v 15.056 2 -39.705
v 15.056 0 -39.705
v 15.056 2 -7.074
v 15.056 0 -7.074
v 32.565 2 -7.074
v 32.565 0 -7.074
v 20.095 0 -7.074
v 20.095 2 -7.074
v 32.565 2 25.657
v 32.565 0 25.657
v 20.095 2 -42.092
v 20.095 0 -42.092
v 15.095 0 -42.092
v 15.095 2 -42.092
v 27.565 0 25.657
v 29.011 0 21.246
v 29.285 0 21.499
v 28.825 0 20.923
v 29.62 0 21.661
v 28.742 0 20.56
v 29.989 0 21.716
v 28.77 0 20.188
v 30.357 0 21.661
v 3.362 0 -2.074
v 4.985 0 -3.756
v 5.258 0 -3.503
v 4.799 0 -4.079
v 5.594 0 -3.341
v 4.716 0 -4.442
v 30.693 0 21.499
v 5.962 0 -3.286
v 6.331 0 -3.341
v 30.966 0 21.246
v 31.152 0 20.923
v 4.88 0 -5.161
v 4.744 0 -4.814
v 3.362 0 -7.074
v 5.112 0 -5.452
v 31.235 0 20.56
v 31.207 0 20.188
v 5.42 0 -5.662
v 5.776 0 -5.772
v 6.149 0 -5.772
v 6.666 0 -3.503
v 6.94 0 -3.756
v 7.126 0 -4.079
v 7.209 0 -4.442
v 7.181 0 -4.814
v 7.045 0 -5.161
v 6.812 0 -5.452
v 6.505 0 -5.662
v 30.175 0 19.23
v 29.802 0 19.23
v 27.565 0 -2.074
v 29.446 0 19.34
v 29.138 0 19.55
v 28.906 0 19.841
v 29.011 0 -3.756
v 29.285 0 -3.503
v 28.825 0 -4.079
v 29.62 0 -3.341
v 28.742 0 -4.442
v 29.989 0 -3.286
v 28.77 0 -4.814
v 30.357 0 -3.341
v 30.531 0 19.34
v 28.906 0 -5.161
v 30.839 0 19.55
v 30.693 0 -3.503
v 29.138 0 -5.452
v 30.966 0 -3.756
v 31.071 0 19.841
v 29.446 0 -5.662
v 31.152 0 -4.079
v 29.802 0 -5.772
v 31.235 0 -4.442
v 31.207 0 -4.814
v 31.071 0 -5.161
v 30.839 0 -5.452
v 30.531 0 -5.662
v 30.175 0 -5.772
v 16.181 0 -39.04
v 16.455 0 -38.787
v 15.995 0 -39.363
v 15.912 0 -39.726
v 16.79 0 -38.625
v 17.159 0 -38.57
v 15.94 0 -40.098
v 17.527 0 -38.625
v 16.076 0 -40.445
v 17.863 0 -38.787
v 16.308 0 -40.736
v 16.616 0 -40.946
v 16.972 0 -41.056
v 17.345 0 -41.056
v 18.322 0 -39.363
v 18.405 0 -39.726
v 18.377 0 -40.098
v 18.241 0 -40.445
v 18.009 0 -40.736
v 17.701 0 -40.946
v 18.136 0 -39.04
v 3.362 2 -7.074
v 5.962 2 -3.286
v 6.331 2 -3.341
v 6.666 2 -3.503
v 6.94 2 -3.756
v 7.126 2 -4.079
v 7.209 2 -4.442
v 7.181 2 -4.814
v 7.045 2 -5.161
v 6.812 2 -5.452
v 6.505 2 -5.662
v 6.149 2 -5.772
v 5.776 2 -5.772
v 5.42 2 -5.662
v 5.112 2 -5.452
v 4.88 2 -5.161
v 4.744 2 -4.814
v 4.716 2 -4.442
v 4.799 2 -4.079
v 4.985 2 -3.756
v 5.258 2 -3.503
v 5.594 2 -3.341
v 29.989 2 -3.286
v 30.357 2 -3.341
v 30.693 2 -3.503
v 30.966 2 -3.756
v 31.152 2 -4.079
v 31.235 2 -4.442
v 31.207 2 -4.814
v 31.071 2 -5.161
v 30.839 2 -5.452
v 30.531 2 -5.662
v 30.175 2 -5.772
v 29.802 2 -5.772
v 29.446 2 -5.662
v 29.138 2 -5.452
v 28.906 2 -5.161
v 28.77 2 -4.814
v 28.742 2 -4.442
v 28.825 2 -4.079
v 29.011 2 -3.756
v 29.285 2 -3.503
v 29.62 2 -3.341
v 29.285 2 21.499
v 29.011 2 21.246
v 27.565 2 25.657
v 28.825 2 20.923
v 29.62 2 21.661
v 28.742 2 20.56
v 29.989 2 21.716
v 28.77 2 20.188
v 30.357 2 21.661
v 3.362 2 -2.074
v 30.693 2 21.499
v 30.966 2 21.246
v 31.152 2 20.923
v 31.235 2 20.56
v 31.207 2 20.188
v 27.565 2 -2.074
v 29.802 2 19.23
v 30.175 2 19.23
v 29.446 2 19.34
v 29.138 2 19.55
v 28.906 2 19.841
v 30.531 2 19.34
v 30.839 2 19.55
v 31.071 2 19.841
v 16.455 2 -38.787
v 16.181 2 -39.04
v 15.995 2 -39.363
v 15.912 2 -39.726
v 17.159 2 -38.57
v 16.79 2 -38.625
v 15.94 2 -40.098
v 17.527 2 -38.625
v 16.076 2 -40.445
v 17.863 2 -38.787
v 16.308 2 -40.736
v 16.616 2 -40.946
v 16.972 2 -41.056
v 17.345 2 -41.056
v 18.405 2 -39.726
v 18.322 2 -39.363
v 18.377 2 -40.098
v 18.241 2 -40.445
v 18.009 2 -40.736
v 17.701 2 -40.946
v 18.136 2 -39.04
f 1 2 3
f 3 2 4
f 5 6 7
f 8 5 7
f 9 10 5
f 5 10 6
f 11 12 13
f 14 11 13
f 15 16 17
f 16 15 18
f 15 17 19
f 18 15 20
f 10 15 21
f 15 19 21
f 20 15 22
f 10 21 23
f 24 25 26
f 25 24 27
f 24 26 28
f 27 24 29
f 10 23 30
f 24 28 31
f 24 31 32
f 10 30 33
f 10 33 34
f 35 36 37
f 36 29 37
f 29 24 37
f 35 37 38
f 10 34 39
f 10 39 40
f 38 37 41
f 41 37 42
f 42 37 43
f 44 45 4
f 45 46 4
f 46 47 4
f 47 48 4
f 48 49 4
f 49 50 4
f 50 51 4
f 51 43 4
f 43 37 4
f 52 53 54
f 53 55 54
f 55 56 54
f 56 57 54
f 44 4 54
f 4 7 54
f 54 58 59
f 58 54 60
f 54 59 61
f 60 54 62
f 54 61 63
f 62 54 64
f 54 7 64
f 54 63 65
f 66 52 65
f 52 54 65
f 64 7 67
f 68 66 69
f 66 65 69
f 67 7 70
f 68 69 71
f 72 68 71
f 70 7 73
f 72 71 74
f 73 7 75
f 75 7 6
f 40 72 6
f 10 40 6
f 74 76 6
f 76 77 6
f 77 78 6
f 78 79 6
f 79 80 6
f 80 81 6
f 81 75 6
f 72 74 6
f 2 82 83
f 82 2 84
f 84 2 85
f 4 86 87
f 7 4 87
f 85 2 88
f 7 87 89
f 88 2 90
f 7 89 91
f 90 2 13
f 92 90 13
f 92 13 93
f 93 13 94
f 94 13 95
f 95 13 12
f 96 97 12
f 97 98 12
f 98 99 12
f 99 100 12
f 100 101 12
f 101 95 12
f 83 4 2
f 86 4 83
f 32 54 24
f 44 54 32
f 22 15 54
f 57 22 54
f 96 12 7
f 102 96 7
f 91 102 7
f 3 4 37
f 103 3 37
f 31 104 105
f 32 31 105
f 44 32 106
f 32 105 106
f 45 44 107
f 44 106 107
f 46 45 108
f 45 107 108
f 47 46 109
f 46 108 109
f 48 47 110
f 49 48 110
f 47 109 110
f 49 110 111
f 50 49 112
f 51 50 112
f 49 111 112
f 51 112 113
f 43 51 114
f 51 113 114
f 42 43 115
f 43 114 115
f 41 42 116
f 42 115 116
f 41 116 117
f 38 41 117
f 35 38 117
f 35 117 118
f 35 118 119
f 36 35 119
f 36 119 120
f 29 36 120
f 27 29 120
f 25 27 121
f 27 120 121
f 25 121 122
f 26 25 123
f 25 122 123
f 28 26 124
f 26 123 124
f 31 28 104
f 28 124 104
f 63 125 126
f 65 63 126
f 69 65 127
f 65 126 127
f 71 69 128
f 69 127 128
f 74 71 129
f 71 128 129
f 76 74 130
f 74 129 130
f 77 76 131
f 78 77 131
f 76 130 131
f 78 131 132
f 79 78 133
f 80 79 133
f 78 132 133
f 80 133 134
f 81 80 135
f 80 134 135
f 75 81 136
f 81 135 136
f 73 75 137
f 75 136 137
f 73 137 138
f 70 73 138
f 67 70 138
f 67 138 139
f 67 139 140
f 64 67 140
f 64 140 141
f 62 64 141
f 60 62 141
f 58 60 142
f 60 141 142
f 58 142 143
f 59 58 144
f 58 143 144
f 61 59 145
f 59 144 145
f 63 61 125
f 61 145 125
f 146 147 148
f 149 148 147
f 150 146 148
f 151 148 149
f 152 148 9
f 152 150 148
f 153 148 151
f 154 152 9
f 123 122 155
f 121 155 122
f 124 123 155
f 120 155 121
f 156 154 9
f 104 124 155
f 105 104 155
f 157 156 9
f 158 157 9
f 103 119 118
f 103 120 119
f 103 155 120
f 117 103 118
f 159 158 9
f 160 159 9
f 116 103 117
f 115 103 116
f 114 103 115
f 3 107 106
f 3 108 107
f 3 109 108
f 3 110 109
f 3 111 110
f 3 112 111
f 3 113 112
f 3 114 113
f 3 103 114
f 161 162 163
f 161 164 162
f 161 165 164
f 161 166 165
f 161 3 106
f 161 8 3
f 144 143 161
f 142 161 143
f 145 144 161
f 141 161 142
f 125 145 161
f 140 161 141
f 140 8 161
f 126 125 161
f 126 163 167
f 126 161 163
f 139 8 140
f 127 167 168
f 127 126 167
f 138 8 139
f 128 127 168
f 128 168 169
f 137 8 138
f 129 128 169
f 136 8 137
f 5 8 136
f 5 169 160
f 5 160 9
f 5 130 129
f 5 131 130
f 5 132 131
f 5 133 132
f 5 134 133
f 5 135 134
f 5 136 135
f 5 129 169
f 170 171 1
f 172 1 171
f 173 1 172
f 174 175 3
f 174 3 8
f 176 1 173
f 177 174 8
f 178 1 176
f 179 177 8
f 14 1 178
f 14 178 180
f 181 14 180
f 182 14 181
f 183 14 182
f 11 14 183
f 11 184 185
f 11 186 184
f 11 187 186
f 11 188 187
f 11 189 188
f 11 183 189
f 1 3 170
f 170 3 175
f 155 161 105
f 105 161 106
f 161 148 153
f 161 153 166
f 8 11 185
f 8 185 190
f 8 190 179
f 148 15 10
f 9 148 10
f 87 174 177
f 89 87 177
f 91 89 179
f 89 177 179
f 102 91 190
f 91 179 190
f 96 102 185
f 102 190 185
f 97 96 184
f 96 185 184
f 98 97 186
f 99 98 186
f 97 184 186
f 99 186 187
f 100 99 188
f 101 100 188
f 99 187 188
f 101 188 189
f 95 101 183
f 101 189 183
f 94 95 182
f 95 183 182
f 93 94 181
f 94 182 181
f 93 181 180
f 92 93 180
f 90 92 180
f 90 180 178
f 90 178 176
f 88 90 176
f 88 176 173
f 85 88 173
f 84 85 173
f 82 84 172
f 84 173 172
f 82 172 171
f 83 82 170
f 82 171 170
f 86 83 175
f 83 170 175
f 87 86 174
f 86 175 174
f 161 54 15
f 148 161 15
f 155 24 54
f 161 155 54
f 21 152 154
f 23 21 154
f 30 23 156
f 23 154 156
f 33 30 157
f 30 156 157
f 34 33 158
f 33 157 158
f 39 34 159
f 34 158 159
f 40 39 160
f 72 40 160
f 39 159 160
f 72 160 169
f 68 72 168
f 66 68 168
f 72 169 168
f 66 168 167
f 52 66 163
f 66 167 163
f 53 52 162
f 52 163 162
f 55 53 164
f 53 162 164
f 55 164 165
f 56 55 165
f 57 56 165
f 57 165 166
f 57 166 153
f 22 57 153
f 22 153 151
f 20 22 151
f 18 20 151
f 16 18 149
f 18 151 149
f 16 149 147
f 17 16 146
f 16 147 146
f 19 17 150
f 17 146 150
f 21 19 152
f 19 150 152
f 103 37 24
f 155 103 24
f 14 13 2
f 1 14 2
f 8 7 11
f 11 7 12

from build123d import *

# Parameters (mm, degrees)
SALIENTE_EXTRUIR2_DEPTH = 2
CROQUIS2_R              = 1.25
CORTAR_EXTRUIR1_DEPTH   = 2


with BuildPart() as part:
    # Croquis1 → Saliente-Extruir2 (new body)
    with BuildSketch(Plane(origin=(0, 0, 0), x_dir=(1, 0, 0), z_dir=(0, 1, 0))):
        Polygon((15.056023907, 39.704773072), (15.056023907, 26.168187684), (15.056023907, 7.074316274), (3.362466557, 7.074316274), (3.362466557, 2.074316274), (27.565385425, 2.074316274), (27.565385425, -25.657265495), (32.565385425, -25.657265495), (32.565385425, 7.074316274), (20.094799992, 7.074316274), (20.094799992, 42.092248366), (15.094799992, 42.092248366), align=None)
    extrude(amount=SALIENTE_EXTRUIR2_DEPTH)

    # Croquis2 → Cortar-Extruir1 (cut)
    with BuildSketch(Plane(origin=(0, 2, 0), x_dir=(1, 0, 0), z_dir=(0, 1, 0))):
        with Locations(Location((17.158653271, 39.819787948, 0), (0, 0, 270))):
            Circle(CROQUIS2_R)
        with Locations(Location((5.962263761, 4.535787948, 0), (0, 0, 270))):
            Circle(CROQUIS2_R)
        with Locations(Location((29.988653271, 4.535787948, 0), (0, 0, 270))):
            Circle(CROQUIS2_R)
        with Locations(Location((29.988653271, -20.46630955, 0), (0, 0, 270))):
            Circle(CROQUIS2_R)
    extrude(amount=-CORTAR_EXTRUIR1_DEPTH, mode=Mode.SUBTRACT)


solid = part.part
